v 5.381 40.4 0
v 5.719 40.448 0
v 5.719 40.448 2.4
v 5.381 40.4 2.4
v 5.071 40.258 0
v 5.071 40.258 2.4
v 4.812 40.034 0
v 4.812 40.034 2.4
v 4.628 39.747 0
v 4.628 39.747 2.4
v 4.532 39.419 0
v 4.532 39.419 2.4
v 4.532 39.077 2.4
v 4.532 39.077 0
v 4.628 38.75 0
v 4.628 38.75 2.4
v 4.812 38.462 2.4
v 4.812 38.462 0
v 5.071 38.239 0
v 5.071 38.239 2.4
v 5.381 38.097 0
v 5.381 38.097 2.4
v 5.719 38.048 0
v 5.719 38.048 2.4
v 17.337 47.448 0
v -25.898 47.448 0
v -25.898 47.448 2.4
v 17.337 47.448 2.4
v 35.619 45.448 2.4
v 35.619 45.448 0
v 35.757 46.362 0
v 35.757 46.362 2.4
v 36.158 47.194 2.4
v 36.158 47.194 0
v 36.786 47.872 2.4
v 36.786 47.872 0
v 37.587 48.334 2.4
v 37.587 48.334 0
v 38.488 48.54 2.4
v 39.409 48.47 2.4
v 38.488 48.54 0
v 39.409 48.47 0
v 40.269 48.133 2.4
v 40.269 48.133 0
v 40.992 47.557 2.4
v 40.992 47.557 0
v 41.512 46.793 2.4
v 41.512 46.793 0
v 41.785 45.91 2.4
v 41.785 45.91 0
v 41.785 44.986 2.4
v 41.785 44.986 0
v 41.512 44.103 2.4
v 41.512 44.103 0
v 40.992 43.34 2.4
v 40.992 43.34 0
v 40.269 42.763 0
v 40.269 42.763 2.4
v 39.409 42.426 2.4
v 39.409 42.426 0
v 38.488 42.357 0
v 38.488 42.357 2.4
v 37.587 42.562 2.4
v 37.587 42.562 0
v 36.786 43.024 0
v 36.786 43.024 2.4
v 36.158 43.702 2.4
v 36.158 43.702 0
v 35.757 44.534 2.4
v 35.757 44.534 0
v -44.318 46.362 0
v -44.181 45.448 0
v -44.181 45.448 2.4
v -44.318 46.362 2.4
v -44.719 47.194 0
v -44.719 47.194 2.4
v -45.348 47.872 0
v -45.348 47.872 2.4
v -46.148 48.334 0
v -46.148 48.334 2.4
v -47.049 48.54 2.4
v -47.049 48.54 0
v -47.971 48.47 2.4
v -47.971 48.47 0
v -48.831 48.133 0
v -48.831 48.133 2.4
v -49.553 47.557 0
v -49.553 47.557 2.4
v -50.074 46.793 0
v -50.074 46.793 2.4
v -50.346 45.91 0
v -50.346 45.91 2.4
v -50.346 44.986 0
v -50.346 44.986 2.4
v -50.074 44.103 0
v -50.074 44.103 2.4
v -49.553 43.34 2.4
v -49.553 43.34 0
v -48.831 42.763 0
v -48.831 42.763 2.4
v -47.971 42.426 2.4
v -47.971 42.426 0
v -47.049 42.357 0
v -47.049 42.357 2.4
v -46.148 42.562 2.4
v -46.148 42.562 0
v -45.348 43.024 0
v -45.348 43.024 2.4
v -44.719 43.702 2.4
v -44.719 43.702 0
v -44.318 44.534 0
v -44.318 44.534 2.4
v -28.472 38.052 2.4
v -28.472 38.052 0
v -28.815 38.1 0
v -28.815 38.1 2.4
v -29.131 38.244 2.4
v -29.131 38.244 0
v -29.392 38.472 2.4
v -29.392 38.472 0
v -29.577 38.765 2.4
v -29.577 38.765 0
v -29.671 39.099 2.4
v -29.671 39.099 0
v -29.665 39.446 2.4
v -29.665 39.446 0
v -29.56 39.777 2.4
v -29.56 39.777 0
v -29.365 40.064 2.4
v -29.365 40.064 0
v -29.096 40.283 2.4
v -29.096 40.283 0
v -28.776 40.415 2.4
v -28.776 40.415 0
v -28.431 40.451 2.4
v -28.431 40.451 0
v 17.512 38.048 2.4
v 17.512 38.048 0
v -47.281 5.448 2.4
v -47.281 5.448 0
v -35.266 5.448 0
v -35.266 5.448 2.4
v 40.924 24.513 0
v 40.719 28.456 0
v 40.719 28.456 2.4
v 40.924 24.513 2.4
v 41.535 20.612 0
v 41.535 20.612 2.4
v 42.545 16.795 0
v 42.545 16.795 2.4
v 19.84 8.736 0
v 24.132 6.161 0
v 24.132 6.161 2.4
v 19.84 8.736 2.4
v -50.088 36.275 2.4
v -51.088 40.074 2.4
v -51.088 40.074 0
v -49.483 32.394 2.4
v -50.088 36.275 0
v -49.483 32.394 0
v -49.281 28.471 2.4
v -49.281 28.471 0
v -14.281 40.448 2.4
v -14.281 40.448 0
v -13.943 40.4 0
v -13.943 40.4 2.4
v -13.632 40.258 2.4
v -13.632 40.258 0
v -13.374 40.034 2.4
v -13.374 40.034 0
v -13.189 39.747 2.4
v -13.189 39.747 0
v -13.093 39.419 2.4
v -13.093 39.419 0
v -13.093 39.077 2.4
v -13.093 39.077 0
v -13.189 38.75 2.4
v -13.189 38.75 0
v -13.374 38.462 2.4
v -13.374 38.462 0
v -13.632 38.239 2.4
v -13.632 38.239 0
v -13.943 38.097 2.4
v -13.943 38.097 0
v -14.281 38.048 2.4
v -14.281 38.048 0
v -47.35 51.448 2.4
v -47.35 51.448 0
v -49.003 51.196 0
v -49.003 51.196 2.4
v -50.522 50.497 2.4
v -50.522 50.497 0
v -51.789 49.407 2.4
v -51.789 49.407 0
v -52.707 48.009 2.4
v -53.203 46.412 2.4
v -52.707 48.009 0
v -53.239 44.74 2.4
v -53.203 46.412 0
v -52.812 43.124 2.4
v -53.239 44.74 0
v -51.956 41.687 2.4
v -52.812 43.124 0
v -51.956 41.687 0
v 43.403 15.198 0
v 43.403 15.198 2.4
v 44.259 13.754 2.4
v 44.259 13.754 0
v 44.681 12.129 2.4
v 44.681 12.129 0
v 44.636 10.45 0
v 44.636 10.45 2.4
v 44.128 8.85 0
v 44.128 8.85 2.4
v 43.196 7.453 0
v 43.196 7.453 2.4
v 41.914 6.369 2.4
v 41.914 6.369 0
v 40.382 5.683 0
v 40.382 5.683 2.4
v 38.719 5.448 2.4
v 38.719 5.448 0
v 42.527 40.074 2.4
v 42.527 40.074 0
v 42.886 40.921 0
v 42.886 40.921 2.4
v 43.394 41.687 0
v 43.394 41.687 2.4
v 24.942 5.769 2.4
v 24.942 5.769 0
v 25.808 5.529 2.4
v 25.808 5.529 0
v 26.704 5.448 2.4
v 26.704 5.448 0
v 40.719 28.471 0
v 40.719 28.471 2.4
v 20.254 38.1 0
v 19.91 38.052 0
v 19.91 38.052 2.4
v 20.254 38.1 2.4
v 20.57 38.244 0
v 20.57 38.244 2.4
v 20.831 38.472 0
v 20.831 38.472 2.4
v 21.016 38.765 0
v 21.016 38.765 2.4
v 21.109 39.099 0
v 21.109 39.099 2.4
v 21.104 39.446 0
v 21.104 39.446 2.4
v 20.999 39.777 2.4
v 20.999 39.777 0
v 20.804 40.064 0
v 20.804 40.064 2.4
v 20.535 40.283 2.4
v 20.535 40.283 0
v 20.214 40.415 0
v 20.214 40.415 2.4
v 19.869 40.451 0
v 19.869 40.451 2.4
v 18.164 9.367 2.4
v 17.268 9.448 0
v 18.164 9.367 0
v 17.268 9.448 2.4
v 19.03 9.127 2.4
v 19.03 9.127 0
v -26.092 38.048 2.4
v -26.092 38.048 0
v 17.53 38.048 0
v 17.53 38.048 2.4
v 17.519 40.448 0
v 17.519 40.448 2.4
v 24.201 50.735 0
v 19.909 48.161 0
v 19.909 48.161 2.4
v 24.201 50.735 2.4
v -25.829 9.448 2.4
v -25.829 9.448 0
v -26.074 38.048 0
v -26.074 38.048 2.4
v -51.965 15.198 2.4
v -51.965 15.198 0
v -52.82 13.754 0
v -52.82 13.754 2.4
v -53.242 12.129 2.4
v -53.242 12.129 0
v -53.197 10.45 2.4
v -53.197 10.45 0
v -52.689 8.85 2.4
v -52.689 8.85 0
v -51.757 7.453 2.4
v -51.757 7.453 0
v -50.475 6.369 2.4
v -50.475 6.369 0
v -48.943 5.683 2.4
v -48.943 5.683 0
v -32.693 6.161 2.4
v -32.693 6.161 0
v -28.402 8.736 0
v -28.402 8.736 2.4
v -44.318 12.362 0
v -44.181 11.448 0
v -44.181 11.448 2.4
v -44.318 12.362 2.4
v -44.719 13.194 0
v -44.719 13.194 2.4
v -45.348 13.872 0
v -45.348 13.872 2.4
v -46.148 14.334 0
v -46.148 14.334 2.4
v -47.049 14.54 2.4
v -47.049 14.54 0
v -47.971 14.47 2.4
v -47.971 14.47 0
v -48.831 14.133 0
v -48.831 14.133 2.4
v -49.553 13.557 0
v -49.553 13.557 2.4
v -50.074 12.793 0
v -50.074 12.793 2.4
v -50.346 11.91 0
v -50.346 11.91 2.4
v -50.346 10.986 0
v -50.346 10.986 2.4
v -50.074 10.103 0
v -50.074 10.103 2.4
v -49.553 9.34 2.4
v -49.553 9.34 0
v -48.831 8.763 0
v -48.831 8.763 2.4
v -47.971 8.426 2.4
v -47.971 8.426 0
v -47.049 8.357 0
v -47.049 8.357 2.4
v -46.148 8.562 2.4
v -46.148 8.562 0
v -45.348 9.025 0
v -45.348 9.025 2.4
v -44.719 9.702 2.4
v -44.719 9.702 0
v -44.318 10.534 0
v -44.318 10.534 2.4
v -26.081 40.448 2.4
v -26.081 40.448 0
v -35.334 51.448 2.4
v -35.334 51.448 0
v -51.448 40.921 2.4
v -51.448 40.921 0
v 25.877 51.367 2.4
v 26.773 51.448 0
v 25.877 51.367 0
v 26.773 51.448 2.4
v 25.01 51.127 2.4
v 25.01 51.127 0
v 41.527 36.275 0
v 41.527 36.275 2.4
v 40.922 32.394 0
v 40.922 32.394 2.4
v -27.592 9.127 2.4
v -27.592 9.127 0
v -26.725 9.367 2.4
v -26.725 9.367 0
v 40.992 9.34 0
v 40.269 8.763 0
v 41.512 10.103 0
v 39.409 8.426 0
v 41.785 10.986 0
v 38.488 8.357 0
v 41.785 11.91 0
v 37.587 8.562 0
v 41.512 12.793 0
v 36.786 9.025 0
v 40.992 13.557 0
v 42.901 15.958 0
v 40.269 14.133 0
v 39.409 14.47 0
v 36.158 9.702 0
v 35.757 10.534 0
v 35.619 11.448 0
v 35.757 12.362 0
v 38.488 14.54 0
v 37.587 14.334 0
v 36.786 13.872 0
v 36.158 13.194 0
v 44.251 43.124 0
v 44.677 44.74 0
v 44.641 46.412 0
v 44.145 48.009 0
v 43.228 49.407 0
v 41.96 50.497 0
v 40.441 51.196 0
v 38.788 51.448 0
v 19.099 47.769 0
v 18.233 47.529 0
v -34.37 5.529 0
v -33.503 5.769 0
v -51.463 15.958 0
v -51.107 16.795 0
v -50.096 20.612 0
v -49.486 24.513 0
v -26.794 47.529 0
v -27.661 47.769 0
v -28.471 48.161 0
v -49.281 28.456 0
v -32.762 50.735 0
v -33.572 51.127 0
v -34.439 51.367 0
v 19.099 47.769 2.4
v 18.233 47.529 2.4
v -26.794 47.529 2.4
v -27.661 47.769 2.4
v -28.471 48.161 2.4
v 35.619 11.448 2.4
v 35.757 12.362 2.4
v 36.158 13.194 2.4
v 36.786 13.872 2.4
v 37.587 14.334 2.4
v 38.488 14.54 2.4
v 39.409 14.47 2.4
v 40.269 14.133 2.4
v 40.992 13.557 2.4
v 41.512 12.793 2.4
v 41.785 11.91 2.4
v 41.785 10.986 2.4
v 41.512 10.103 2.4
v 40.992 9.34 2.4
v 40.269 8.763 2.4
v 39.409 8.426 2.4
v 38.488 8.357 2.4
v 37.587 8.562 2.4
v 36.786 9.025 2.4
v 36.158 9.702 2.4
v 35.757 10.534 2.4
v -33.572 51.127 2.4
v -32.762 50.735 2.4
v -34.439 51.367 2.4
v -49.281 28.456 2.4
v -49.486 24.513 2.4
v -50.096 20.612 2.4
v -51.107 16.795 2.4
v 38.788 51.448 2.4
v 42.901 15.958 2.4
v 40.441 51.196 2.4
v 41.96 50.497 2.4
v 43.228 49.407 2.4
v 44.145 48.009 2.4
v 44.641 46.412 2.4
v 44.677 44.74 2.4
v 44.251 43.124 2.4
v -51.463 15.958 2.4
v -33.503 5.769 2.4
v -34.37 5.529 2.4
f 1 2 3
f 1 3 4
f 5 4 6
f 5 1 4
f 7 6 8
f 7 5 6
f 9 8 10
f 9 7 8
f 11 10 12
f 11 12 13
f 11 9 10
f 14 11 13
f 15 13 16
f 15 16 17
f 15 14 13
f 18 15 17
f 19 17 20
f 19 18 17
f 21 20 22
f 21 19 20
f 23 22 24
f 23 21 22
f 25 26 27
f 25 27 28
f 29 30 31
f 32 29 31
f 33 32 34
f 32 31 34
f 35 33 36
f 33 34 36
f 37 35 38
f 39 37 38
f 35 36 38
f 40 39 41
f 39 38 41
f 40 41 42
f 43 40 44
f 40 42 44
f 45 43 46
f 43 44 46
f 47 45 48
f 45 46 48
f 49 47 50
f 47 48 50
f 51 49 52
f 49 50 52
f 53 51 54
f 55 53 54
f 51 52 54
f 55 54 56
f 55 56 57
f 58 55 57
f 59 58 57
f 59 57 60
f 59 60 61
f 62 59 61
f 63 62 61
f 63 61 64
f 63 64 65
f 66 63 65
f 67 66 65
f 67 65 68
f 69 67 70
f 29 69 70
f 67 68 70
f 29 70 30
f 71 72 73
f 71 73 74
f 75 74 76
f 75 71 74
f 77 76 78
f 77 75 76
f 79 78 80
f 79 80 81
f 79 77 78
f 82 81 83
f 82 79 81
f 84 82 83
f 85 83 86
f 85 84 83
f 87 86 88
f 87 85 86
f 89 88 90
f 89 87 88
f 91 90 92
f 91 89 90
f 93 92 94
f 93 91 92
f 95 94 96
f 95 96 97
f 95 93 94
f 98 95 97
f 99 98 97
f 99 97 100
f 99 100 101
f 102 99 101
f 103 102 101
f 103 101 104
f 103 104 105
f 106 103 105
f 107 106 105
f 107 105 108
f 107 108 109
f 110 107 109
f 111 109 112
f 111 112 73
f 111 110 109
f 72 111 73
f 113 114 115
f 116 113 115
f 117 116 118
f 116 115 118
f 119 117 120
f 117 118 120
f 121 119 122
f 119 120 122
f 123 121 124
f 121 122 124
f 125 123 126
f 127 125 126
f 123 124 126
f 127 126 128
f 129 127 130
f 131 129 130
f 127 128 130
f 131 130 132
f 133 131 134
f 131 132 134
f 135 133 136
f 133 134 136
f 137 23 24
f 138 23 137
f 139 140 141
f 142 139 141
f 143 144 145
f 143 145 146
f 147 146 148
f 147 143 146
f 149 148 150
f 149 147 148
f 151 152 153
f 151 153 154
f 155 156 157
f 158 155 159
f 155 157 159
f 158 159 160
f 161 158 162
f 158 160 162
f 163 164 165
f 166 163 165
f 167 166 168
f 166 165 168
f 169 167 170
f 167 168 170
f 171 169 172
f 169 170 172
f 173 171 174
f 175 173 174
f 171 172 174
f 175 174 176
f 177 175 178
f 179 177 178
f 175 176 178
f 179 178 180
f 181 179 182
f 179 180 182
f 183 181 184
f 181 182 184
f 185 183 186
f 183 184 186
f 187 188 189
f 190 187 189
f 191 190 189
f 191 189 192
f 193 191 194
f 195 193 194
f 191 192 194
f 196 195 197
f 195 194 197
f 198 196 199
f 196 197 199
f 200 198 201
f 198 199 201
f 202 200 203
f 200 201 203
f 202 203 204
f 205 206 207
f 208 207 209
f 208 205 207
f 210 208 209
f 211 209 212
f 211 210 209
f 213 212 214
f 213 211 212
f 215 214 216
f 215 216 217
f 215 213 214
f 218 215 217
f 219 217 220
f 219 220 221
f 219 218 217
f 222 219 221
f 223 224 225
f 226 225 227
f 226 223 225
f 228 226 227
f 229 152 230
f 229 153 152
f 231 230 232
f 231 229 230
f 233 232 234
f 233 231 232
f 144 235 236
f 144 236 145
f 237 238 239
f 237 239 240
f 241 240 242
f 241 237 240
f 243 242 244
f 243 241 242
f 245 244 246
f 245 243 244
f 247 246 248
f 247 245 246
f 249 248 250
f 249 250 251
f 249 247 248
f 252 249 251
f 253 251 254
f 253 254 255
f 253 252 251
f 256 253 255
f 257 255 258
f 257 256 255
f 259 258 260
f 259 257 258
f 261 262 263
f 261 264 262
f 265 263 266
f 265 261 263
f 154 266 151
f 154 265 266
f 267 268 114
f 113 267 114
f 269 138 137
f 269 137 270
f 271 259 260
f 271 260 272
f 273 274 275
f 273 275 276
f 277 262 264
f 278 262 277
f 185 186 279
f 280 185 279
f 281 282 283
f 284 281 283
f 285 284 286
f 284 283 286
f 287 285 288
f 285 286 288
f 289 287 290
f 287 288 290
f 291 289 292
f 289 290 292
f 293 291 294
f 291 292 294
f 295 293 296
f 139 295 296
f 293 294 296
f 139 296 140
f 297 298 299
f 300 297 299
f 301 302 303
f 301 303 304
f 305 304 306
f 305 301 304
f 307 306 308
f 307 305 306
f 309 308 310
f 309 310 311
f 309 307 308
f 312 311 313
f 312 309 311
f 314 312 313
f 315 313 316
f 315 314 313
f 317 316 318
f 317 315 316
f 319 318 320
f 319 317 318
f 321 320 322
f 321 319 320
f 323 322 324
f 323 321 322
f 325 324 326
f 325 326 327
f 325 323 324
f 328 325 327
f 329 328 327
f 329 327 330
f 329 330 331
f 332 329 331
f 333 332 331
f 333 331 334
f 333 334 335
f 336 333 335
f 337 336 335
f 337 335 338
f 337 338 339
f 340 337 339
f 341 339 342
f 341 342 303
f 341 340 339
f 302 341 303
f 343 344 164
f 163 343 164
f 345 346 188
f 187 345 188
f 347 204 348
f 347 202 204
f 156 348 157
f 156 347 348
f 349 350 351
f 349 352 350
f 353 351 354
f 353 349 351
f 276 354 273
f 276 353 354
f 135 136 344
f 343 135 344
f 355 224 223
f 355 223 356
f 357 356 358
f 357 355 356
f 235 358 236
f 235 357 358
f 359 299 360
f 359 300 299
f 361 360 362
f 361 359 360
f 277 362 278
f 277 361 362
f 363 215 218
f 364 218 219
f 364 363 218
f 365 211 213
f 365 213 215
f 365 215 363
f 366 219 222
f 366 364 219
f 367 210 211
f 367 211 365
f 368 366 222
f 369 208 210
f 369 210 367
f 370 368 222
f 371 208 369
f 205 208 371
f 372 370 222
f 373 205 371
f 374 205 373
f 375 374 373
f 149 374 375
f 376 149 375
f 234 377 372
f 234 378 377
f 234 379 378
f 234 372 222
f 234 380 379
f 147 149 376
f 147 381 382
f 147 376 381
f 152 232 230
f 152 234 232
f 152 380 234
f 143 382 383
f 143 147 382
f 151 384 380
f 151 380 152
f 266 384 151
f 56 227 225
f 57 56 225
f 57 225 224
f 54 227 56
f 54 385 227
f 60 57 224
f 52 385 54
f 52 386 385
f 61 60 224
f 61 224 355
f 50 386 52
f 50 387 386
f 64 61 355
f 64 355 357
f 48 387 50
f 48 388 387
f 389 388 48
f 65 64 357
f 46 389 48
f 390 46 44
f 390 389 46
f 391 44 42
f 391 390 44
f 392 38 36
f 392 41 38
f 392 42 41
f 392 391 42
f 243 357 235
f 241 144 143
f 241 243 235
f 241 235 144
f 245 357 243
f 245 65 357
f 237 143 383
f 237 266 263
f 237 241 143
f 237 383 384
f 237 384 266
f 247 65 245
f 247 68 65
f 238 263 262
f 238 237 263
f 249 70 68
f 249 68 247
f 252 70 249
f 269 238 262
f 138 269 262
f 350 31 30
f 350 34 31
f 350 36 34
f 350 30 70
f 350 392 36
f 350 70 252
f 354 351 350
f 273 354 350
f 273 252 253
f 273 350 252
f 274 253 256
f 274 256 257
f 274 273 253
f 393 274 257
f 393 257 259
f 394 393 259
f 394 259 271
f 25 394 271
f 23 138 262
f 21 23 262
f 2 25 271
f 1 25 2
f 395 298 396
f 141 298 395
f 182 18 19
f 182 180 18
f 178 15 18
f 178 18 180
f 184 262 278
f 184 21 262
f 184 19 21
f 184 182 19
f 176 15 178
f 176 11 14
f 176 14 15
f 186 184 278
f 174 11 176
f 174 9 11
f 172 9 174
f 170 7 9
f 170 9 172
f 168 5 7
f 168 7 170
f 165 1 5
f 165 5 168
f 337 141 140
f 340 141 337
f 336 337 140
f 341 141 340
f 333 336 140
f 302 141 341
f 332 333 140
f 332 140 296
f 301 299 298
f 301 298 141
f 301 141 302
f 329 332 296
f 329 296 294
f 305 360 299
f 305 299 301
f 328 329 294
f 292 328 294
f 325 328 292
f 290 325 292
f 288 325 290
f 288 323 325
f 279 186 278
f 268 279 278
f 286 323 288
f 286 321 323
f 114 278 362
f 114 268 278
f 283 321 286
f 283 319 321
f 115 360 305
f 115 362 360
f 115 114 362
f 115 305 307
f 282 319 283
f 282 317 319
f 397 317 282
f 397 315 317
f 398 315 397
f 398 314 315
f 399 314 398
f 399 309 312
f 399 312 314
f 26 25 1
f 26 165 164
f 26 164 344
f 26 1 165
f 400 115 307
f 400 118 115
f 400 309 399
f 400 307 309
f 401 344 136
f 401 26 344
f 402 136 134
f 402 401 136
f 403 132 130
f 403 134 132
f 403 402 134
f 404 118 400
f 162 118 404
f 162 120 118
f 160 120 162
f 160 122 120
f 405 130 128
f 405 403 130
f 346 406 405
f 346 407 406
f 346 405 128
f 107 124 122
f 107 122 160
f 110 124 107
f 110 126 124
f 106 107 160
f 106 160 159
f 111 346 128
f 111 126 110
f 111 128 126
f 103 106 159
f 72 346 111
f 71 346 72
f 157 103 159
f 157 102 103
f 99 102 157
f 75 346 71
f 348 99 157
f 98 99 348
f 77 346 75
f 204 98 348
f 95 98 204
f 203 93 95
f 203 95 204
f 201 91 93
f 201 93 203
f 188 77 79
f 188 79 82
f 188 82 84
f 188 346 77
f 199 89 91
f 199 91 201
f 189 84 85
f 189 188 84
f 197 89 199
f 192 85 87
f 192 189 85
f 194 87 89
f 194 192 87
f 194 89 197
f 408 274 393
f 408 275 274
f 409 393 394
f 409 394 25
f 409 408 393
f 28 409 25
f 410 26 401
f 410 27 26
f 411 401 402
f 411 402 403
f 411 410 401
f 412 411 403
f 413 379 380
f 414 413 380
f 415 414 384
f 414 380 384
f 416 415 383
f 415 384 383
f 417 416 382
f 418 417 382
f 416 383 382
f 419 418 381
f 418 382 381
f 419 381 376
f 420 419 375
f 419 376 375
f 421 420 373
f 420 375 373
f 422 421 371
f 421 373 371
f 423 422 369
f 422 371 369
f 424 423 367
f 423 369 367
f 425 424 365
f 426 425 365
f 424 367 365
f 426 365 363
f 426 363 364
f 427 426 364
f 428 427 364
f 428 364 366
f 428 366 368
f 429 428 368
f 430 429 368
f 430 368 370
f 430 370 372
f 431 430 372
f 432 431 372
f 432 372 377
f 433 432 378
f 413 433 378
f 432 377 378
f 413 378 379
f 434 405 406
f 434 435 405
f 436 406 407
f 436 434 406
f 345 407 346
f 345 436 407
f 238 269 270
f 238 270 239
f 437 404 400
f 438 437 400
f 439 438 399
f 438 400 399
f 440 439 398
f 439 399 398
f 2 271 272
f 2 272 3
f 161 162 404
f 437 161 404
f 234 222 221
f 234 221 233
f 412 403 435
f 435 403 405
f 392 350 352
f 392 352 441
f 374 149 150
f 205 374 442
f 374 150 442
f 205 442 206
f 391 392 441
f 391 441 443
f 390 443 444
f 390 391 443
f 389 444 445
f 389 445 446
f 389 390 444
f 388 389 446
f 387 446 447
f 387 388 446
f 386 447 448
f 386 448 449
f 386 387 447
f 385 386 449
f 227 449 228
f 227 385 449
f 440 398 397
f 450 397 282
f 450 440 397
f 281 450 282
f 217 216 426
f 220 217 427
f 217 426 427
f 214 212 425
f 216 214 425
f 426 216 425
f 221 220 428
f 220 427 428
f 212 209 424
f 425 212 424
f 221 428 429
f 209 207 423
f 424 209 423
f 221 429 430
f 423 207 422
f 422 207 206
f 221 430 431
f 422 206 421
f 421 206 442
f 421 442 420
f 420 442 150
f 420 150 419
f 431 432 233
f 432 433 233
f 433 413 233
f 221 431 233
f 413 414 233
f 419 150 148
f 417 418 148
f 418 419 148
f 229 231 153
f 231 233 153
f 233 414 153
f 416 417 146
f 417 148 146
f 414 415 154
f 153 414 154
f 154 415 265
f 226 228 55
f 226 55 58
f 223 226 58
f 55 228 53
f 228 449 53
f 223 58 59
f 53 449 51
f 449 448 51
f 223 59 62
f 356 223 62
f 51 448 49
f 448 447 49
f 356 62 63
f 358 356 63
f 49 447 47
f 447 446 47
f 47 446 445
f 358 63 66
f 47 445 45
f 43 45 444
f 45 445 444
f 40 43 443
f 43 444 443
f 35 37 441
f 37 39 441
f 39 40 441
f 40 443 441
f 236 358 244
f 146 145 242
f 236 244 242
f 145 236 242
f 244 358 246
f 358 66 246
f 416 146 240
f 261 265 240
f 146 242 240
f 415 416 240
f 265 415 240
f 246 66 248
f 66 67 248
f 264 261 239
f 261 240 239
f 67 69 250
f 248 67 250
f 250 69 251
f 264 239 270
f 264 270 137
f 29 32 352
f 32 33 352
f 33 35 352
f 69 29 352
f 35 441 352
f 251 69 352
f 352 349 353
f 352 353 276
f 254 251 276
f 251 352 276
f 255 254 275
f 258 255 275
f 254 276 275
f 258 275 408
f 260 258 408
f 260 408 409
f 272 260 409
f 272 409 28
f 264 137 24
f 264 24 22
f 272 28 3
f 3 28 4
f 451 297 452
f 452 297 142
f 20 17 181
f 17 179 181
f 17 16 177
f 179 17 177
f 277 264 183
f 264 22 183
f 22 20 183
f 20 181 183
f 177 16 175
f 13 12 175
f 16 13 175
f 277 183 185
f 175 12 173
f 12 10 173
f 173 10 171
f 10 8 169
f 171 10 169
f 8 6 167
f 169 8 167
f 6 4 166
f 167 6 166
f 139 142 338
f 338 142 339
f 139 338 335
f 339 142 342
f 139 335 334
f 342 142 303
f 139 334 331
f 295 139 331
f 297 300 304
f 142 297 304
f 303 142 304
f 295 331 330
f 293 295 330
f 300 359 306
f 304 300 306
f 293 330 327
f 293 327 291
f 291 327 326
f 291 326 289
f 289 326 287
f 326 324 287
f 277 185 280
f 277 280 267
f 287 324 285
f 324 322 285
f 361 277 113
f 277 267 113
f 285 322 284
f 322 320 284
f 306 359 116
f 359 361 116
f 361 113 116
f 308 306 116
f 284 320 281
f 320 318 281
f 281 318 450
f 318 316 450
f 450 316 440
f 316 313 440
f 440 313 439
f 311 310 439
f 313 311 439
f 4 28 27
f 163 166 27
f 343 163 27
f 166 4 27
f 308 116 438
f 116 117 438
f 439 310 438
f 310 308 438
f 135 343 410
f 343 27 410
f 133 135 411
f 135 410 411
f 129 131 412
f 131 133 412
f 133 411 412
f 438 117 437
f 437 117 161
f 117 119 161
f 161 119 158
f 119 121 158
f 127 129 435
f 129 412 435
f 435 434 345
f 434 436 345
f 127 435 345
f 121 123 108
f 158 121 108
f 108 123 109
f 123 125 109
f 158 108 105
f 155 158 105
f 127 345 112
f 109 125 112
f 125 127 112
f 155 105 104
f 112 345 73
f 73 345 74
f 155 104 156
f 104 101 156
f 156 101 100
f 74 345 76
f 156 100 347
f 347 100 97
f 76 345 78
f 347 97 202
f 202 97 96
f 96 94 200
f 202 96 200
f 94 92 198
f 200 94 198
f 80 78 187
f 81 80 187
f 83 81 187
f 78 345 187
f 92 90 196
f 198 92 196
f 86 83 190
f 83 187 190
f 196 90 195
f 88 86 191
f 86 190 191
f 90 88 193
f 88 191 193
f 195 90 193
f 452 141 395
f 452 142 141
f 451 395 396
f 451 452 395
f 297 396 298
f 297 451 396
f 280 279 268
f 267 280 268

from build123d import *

# Parameters (mm, degrees)
F0_R     = 3.1
F1_DEPTH = 2.4
F3_R     = 5


with BuildPart() as f1:
    # F0 (on Top) → F1 (new body)
    with BuildSketch(Plane.XY):
        with BuildLine():
            ThreePointArc((-49.28070274, 28.4556998014), (-49.8292635669, 22.013644053), (-51.4566855291, 15.7564482751))
            ThreePointArc((-51.4566855291, 15.7564482751), (-52.8417128359, 9.1953601987), (-47.2807049618, 5.4481787499))
            Line((-47.2807049618, 5.4481787499), (-33.8807049618, 5.4481787499))
            Line((-33.8807049618, 5.4481787499), (-27.2140382951, 9.4481787499))
            Line((-27.2140382951, 9.4481787499), (-4.28070274, 9.4481787499))
            Line((-4.28070274, 9.4481787499), (-4.28070274, 11.4481787499))
            Line((-4.28070274, 11.4481787499), (-4.28070274, 45.4481766123))
            Line((-4.28070274, 45.4481766123), (-4.28070274, 47.4481766123))
            Line((-4.28070274, 47.4481766123), (-27.2831063748, 47.4481766123))
            Line((-27.2831063748, 47.4481766123), (-33.9495535553, 51.447781563))
            Line((-33.9495535553, 51.447781563), (-47.2118519247, 51.447781563))
            Line((-47.2118519247, 51.447781563), (-47.3495535553, 51.447781563))
            ThreePointArc((-47.3495535553, 51.447781563), (-52.8586646481, 47.6586835568), (-51.4406336464, 41.1244080183))
            ThreePointArc((-51.4406336464, 41.1244080183), (-49.8251900555, 34.8889789679), (-49.28070274, 28.4707419045))
            Line((-49.28070274, 28.4707419045), (-49.28070274, 28.4556998014))
        make_face()
        with Locations((-47.2807049618, 11.4481787499)):
            Circle(F0_R, mode=Mode.SUBTRACT)
        with Locations((-47.28070274, 45.4481766123)):
            Circle(F0_R, mode=Mode.SUBTRACT)
        with BuildLine():
            Line((-28.4305080615, 40.4512316858), (-26.08070274, 40.4481766123))
            Line((-26.08070274, 40.4481766123), (-14.28070274, 40.4481766123))
            ThreePointArc((-14.28070274, 40.4481766123), (-13.0807048557, 39.2481744965), (-14.2807069714, 38.0481766123))
            Line((-14.2807069714, 38.0481766123), (-26.0736386877, 38.0481974045))
            Line((-26.0736386877, 38.0481974045), (-26.0918883742, 38.0482287461))
            Line((-26.0918883742, 38.0482287461), (-28.4716546856, 38.0523157045))
            ThreePointArc((-28.4716546856, 38.0523157045), (-29.6805192393, 39.2728612272), (-28.4305080615, 40.4512316858))
        make_face(mode=Mode.SUBTRACT)
    extrude(amount=F1_DEPTH)

    # F2: F1 across face


with BuildPart() as f1_1:
    add(f1.part)
    add(f1.part.mirror(Plane(origin=(-4.28070274, 28.4481776811, 1.2), x_dir=(0, 1, 0), z_dir=(1, 0, 0))))

    # F3
    f3_edges = [f1_1.edges().sort_by_distance(p)[0] for p in [
        (-33.949554, 51.447782, 1.2),
        (-27.283106, 47.448177, 1.2),
        (18.721701, 47.448177, 1.2),
        (25.388148, 51.447782, 1.2),
        (-33.880705, 5.448179, 1.2),
        (-27.214038, 9.448179, 1.2),
        (18.652633, 9.448179, 1.2),
        (25.319299, 5.448179, 1.2),
        (-51.456686, 15.756448, 1.2),
        (-51.440634, 41.124408, 1.2),
        (42.89528, 15.756448, 1.2),
        (42.879228, 41.124408, 1.2),
    ]]
    fillet(f3_edges, radius=F3_R)


solid = f1_1.part
